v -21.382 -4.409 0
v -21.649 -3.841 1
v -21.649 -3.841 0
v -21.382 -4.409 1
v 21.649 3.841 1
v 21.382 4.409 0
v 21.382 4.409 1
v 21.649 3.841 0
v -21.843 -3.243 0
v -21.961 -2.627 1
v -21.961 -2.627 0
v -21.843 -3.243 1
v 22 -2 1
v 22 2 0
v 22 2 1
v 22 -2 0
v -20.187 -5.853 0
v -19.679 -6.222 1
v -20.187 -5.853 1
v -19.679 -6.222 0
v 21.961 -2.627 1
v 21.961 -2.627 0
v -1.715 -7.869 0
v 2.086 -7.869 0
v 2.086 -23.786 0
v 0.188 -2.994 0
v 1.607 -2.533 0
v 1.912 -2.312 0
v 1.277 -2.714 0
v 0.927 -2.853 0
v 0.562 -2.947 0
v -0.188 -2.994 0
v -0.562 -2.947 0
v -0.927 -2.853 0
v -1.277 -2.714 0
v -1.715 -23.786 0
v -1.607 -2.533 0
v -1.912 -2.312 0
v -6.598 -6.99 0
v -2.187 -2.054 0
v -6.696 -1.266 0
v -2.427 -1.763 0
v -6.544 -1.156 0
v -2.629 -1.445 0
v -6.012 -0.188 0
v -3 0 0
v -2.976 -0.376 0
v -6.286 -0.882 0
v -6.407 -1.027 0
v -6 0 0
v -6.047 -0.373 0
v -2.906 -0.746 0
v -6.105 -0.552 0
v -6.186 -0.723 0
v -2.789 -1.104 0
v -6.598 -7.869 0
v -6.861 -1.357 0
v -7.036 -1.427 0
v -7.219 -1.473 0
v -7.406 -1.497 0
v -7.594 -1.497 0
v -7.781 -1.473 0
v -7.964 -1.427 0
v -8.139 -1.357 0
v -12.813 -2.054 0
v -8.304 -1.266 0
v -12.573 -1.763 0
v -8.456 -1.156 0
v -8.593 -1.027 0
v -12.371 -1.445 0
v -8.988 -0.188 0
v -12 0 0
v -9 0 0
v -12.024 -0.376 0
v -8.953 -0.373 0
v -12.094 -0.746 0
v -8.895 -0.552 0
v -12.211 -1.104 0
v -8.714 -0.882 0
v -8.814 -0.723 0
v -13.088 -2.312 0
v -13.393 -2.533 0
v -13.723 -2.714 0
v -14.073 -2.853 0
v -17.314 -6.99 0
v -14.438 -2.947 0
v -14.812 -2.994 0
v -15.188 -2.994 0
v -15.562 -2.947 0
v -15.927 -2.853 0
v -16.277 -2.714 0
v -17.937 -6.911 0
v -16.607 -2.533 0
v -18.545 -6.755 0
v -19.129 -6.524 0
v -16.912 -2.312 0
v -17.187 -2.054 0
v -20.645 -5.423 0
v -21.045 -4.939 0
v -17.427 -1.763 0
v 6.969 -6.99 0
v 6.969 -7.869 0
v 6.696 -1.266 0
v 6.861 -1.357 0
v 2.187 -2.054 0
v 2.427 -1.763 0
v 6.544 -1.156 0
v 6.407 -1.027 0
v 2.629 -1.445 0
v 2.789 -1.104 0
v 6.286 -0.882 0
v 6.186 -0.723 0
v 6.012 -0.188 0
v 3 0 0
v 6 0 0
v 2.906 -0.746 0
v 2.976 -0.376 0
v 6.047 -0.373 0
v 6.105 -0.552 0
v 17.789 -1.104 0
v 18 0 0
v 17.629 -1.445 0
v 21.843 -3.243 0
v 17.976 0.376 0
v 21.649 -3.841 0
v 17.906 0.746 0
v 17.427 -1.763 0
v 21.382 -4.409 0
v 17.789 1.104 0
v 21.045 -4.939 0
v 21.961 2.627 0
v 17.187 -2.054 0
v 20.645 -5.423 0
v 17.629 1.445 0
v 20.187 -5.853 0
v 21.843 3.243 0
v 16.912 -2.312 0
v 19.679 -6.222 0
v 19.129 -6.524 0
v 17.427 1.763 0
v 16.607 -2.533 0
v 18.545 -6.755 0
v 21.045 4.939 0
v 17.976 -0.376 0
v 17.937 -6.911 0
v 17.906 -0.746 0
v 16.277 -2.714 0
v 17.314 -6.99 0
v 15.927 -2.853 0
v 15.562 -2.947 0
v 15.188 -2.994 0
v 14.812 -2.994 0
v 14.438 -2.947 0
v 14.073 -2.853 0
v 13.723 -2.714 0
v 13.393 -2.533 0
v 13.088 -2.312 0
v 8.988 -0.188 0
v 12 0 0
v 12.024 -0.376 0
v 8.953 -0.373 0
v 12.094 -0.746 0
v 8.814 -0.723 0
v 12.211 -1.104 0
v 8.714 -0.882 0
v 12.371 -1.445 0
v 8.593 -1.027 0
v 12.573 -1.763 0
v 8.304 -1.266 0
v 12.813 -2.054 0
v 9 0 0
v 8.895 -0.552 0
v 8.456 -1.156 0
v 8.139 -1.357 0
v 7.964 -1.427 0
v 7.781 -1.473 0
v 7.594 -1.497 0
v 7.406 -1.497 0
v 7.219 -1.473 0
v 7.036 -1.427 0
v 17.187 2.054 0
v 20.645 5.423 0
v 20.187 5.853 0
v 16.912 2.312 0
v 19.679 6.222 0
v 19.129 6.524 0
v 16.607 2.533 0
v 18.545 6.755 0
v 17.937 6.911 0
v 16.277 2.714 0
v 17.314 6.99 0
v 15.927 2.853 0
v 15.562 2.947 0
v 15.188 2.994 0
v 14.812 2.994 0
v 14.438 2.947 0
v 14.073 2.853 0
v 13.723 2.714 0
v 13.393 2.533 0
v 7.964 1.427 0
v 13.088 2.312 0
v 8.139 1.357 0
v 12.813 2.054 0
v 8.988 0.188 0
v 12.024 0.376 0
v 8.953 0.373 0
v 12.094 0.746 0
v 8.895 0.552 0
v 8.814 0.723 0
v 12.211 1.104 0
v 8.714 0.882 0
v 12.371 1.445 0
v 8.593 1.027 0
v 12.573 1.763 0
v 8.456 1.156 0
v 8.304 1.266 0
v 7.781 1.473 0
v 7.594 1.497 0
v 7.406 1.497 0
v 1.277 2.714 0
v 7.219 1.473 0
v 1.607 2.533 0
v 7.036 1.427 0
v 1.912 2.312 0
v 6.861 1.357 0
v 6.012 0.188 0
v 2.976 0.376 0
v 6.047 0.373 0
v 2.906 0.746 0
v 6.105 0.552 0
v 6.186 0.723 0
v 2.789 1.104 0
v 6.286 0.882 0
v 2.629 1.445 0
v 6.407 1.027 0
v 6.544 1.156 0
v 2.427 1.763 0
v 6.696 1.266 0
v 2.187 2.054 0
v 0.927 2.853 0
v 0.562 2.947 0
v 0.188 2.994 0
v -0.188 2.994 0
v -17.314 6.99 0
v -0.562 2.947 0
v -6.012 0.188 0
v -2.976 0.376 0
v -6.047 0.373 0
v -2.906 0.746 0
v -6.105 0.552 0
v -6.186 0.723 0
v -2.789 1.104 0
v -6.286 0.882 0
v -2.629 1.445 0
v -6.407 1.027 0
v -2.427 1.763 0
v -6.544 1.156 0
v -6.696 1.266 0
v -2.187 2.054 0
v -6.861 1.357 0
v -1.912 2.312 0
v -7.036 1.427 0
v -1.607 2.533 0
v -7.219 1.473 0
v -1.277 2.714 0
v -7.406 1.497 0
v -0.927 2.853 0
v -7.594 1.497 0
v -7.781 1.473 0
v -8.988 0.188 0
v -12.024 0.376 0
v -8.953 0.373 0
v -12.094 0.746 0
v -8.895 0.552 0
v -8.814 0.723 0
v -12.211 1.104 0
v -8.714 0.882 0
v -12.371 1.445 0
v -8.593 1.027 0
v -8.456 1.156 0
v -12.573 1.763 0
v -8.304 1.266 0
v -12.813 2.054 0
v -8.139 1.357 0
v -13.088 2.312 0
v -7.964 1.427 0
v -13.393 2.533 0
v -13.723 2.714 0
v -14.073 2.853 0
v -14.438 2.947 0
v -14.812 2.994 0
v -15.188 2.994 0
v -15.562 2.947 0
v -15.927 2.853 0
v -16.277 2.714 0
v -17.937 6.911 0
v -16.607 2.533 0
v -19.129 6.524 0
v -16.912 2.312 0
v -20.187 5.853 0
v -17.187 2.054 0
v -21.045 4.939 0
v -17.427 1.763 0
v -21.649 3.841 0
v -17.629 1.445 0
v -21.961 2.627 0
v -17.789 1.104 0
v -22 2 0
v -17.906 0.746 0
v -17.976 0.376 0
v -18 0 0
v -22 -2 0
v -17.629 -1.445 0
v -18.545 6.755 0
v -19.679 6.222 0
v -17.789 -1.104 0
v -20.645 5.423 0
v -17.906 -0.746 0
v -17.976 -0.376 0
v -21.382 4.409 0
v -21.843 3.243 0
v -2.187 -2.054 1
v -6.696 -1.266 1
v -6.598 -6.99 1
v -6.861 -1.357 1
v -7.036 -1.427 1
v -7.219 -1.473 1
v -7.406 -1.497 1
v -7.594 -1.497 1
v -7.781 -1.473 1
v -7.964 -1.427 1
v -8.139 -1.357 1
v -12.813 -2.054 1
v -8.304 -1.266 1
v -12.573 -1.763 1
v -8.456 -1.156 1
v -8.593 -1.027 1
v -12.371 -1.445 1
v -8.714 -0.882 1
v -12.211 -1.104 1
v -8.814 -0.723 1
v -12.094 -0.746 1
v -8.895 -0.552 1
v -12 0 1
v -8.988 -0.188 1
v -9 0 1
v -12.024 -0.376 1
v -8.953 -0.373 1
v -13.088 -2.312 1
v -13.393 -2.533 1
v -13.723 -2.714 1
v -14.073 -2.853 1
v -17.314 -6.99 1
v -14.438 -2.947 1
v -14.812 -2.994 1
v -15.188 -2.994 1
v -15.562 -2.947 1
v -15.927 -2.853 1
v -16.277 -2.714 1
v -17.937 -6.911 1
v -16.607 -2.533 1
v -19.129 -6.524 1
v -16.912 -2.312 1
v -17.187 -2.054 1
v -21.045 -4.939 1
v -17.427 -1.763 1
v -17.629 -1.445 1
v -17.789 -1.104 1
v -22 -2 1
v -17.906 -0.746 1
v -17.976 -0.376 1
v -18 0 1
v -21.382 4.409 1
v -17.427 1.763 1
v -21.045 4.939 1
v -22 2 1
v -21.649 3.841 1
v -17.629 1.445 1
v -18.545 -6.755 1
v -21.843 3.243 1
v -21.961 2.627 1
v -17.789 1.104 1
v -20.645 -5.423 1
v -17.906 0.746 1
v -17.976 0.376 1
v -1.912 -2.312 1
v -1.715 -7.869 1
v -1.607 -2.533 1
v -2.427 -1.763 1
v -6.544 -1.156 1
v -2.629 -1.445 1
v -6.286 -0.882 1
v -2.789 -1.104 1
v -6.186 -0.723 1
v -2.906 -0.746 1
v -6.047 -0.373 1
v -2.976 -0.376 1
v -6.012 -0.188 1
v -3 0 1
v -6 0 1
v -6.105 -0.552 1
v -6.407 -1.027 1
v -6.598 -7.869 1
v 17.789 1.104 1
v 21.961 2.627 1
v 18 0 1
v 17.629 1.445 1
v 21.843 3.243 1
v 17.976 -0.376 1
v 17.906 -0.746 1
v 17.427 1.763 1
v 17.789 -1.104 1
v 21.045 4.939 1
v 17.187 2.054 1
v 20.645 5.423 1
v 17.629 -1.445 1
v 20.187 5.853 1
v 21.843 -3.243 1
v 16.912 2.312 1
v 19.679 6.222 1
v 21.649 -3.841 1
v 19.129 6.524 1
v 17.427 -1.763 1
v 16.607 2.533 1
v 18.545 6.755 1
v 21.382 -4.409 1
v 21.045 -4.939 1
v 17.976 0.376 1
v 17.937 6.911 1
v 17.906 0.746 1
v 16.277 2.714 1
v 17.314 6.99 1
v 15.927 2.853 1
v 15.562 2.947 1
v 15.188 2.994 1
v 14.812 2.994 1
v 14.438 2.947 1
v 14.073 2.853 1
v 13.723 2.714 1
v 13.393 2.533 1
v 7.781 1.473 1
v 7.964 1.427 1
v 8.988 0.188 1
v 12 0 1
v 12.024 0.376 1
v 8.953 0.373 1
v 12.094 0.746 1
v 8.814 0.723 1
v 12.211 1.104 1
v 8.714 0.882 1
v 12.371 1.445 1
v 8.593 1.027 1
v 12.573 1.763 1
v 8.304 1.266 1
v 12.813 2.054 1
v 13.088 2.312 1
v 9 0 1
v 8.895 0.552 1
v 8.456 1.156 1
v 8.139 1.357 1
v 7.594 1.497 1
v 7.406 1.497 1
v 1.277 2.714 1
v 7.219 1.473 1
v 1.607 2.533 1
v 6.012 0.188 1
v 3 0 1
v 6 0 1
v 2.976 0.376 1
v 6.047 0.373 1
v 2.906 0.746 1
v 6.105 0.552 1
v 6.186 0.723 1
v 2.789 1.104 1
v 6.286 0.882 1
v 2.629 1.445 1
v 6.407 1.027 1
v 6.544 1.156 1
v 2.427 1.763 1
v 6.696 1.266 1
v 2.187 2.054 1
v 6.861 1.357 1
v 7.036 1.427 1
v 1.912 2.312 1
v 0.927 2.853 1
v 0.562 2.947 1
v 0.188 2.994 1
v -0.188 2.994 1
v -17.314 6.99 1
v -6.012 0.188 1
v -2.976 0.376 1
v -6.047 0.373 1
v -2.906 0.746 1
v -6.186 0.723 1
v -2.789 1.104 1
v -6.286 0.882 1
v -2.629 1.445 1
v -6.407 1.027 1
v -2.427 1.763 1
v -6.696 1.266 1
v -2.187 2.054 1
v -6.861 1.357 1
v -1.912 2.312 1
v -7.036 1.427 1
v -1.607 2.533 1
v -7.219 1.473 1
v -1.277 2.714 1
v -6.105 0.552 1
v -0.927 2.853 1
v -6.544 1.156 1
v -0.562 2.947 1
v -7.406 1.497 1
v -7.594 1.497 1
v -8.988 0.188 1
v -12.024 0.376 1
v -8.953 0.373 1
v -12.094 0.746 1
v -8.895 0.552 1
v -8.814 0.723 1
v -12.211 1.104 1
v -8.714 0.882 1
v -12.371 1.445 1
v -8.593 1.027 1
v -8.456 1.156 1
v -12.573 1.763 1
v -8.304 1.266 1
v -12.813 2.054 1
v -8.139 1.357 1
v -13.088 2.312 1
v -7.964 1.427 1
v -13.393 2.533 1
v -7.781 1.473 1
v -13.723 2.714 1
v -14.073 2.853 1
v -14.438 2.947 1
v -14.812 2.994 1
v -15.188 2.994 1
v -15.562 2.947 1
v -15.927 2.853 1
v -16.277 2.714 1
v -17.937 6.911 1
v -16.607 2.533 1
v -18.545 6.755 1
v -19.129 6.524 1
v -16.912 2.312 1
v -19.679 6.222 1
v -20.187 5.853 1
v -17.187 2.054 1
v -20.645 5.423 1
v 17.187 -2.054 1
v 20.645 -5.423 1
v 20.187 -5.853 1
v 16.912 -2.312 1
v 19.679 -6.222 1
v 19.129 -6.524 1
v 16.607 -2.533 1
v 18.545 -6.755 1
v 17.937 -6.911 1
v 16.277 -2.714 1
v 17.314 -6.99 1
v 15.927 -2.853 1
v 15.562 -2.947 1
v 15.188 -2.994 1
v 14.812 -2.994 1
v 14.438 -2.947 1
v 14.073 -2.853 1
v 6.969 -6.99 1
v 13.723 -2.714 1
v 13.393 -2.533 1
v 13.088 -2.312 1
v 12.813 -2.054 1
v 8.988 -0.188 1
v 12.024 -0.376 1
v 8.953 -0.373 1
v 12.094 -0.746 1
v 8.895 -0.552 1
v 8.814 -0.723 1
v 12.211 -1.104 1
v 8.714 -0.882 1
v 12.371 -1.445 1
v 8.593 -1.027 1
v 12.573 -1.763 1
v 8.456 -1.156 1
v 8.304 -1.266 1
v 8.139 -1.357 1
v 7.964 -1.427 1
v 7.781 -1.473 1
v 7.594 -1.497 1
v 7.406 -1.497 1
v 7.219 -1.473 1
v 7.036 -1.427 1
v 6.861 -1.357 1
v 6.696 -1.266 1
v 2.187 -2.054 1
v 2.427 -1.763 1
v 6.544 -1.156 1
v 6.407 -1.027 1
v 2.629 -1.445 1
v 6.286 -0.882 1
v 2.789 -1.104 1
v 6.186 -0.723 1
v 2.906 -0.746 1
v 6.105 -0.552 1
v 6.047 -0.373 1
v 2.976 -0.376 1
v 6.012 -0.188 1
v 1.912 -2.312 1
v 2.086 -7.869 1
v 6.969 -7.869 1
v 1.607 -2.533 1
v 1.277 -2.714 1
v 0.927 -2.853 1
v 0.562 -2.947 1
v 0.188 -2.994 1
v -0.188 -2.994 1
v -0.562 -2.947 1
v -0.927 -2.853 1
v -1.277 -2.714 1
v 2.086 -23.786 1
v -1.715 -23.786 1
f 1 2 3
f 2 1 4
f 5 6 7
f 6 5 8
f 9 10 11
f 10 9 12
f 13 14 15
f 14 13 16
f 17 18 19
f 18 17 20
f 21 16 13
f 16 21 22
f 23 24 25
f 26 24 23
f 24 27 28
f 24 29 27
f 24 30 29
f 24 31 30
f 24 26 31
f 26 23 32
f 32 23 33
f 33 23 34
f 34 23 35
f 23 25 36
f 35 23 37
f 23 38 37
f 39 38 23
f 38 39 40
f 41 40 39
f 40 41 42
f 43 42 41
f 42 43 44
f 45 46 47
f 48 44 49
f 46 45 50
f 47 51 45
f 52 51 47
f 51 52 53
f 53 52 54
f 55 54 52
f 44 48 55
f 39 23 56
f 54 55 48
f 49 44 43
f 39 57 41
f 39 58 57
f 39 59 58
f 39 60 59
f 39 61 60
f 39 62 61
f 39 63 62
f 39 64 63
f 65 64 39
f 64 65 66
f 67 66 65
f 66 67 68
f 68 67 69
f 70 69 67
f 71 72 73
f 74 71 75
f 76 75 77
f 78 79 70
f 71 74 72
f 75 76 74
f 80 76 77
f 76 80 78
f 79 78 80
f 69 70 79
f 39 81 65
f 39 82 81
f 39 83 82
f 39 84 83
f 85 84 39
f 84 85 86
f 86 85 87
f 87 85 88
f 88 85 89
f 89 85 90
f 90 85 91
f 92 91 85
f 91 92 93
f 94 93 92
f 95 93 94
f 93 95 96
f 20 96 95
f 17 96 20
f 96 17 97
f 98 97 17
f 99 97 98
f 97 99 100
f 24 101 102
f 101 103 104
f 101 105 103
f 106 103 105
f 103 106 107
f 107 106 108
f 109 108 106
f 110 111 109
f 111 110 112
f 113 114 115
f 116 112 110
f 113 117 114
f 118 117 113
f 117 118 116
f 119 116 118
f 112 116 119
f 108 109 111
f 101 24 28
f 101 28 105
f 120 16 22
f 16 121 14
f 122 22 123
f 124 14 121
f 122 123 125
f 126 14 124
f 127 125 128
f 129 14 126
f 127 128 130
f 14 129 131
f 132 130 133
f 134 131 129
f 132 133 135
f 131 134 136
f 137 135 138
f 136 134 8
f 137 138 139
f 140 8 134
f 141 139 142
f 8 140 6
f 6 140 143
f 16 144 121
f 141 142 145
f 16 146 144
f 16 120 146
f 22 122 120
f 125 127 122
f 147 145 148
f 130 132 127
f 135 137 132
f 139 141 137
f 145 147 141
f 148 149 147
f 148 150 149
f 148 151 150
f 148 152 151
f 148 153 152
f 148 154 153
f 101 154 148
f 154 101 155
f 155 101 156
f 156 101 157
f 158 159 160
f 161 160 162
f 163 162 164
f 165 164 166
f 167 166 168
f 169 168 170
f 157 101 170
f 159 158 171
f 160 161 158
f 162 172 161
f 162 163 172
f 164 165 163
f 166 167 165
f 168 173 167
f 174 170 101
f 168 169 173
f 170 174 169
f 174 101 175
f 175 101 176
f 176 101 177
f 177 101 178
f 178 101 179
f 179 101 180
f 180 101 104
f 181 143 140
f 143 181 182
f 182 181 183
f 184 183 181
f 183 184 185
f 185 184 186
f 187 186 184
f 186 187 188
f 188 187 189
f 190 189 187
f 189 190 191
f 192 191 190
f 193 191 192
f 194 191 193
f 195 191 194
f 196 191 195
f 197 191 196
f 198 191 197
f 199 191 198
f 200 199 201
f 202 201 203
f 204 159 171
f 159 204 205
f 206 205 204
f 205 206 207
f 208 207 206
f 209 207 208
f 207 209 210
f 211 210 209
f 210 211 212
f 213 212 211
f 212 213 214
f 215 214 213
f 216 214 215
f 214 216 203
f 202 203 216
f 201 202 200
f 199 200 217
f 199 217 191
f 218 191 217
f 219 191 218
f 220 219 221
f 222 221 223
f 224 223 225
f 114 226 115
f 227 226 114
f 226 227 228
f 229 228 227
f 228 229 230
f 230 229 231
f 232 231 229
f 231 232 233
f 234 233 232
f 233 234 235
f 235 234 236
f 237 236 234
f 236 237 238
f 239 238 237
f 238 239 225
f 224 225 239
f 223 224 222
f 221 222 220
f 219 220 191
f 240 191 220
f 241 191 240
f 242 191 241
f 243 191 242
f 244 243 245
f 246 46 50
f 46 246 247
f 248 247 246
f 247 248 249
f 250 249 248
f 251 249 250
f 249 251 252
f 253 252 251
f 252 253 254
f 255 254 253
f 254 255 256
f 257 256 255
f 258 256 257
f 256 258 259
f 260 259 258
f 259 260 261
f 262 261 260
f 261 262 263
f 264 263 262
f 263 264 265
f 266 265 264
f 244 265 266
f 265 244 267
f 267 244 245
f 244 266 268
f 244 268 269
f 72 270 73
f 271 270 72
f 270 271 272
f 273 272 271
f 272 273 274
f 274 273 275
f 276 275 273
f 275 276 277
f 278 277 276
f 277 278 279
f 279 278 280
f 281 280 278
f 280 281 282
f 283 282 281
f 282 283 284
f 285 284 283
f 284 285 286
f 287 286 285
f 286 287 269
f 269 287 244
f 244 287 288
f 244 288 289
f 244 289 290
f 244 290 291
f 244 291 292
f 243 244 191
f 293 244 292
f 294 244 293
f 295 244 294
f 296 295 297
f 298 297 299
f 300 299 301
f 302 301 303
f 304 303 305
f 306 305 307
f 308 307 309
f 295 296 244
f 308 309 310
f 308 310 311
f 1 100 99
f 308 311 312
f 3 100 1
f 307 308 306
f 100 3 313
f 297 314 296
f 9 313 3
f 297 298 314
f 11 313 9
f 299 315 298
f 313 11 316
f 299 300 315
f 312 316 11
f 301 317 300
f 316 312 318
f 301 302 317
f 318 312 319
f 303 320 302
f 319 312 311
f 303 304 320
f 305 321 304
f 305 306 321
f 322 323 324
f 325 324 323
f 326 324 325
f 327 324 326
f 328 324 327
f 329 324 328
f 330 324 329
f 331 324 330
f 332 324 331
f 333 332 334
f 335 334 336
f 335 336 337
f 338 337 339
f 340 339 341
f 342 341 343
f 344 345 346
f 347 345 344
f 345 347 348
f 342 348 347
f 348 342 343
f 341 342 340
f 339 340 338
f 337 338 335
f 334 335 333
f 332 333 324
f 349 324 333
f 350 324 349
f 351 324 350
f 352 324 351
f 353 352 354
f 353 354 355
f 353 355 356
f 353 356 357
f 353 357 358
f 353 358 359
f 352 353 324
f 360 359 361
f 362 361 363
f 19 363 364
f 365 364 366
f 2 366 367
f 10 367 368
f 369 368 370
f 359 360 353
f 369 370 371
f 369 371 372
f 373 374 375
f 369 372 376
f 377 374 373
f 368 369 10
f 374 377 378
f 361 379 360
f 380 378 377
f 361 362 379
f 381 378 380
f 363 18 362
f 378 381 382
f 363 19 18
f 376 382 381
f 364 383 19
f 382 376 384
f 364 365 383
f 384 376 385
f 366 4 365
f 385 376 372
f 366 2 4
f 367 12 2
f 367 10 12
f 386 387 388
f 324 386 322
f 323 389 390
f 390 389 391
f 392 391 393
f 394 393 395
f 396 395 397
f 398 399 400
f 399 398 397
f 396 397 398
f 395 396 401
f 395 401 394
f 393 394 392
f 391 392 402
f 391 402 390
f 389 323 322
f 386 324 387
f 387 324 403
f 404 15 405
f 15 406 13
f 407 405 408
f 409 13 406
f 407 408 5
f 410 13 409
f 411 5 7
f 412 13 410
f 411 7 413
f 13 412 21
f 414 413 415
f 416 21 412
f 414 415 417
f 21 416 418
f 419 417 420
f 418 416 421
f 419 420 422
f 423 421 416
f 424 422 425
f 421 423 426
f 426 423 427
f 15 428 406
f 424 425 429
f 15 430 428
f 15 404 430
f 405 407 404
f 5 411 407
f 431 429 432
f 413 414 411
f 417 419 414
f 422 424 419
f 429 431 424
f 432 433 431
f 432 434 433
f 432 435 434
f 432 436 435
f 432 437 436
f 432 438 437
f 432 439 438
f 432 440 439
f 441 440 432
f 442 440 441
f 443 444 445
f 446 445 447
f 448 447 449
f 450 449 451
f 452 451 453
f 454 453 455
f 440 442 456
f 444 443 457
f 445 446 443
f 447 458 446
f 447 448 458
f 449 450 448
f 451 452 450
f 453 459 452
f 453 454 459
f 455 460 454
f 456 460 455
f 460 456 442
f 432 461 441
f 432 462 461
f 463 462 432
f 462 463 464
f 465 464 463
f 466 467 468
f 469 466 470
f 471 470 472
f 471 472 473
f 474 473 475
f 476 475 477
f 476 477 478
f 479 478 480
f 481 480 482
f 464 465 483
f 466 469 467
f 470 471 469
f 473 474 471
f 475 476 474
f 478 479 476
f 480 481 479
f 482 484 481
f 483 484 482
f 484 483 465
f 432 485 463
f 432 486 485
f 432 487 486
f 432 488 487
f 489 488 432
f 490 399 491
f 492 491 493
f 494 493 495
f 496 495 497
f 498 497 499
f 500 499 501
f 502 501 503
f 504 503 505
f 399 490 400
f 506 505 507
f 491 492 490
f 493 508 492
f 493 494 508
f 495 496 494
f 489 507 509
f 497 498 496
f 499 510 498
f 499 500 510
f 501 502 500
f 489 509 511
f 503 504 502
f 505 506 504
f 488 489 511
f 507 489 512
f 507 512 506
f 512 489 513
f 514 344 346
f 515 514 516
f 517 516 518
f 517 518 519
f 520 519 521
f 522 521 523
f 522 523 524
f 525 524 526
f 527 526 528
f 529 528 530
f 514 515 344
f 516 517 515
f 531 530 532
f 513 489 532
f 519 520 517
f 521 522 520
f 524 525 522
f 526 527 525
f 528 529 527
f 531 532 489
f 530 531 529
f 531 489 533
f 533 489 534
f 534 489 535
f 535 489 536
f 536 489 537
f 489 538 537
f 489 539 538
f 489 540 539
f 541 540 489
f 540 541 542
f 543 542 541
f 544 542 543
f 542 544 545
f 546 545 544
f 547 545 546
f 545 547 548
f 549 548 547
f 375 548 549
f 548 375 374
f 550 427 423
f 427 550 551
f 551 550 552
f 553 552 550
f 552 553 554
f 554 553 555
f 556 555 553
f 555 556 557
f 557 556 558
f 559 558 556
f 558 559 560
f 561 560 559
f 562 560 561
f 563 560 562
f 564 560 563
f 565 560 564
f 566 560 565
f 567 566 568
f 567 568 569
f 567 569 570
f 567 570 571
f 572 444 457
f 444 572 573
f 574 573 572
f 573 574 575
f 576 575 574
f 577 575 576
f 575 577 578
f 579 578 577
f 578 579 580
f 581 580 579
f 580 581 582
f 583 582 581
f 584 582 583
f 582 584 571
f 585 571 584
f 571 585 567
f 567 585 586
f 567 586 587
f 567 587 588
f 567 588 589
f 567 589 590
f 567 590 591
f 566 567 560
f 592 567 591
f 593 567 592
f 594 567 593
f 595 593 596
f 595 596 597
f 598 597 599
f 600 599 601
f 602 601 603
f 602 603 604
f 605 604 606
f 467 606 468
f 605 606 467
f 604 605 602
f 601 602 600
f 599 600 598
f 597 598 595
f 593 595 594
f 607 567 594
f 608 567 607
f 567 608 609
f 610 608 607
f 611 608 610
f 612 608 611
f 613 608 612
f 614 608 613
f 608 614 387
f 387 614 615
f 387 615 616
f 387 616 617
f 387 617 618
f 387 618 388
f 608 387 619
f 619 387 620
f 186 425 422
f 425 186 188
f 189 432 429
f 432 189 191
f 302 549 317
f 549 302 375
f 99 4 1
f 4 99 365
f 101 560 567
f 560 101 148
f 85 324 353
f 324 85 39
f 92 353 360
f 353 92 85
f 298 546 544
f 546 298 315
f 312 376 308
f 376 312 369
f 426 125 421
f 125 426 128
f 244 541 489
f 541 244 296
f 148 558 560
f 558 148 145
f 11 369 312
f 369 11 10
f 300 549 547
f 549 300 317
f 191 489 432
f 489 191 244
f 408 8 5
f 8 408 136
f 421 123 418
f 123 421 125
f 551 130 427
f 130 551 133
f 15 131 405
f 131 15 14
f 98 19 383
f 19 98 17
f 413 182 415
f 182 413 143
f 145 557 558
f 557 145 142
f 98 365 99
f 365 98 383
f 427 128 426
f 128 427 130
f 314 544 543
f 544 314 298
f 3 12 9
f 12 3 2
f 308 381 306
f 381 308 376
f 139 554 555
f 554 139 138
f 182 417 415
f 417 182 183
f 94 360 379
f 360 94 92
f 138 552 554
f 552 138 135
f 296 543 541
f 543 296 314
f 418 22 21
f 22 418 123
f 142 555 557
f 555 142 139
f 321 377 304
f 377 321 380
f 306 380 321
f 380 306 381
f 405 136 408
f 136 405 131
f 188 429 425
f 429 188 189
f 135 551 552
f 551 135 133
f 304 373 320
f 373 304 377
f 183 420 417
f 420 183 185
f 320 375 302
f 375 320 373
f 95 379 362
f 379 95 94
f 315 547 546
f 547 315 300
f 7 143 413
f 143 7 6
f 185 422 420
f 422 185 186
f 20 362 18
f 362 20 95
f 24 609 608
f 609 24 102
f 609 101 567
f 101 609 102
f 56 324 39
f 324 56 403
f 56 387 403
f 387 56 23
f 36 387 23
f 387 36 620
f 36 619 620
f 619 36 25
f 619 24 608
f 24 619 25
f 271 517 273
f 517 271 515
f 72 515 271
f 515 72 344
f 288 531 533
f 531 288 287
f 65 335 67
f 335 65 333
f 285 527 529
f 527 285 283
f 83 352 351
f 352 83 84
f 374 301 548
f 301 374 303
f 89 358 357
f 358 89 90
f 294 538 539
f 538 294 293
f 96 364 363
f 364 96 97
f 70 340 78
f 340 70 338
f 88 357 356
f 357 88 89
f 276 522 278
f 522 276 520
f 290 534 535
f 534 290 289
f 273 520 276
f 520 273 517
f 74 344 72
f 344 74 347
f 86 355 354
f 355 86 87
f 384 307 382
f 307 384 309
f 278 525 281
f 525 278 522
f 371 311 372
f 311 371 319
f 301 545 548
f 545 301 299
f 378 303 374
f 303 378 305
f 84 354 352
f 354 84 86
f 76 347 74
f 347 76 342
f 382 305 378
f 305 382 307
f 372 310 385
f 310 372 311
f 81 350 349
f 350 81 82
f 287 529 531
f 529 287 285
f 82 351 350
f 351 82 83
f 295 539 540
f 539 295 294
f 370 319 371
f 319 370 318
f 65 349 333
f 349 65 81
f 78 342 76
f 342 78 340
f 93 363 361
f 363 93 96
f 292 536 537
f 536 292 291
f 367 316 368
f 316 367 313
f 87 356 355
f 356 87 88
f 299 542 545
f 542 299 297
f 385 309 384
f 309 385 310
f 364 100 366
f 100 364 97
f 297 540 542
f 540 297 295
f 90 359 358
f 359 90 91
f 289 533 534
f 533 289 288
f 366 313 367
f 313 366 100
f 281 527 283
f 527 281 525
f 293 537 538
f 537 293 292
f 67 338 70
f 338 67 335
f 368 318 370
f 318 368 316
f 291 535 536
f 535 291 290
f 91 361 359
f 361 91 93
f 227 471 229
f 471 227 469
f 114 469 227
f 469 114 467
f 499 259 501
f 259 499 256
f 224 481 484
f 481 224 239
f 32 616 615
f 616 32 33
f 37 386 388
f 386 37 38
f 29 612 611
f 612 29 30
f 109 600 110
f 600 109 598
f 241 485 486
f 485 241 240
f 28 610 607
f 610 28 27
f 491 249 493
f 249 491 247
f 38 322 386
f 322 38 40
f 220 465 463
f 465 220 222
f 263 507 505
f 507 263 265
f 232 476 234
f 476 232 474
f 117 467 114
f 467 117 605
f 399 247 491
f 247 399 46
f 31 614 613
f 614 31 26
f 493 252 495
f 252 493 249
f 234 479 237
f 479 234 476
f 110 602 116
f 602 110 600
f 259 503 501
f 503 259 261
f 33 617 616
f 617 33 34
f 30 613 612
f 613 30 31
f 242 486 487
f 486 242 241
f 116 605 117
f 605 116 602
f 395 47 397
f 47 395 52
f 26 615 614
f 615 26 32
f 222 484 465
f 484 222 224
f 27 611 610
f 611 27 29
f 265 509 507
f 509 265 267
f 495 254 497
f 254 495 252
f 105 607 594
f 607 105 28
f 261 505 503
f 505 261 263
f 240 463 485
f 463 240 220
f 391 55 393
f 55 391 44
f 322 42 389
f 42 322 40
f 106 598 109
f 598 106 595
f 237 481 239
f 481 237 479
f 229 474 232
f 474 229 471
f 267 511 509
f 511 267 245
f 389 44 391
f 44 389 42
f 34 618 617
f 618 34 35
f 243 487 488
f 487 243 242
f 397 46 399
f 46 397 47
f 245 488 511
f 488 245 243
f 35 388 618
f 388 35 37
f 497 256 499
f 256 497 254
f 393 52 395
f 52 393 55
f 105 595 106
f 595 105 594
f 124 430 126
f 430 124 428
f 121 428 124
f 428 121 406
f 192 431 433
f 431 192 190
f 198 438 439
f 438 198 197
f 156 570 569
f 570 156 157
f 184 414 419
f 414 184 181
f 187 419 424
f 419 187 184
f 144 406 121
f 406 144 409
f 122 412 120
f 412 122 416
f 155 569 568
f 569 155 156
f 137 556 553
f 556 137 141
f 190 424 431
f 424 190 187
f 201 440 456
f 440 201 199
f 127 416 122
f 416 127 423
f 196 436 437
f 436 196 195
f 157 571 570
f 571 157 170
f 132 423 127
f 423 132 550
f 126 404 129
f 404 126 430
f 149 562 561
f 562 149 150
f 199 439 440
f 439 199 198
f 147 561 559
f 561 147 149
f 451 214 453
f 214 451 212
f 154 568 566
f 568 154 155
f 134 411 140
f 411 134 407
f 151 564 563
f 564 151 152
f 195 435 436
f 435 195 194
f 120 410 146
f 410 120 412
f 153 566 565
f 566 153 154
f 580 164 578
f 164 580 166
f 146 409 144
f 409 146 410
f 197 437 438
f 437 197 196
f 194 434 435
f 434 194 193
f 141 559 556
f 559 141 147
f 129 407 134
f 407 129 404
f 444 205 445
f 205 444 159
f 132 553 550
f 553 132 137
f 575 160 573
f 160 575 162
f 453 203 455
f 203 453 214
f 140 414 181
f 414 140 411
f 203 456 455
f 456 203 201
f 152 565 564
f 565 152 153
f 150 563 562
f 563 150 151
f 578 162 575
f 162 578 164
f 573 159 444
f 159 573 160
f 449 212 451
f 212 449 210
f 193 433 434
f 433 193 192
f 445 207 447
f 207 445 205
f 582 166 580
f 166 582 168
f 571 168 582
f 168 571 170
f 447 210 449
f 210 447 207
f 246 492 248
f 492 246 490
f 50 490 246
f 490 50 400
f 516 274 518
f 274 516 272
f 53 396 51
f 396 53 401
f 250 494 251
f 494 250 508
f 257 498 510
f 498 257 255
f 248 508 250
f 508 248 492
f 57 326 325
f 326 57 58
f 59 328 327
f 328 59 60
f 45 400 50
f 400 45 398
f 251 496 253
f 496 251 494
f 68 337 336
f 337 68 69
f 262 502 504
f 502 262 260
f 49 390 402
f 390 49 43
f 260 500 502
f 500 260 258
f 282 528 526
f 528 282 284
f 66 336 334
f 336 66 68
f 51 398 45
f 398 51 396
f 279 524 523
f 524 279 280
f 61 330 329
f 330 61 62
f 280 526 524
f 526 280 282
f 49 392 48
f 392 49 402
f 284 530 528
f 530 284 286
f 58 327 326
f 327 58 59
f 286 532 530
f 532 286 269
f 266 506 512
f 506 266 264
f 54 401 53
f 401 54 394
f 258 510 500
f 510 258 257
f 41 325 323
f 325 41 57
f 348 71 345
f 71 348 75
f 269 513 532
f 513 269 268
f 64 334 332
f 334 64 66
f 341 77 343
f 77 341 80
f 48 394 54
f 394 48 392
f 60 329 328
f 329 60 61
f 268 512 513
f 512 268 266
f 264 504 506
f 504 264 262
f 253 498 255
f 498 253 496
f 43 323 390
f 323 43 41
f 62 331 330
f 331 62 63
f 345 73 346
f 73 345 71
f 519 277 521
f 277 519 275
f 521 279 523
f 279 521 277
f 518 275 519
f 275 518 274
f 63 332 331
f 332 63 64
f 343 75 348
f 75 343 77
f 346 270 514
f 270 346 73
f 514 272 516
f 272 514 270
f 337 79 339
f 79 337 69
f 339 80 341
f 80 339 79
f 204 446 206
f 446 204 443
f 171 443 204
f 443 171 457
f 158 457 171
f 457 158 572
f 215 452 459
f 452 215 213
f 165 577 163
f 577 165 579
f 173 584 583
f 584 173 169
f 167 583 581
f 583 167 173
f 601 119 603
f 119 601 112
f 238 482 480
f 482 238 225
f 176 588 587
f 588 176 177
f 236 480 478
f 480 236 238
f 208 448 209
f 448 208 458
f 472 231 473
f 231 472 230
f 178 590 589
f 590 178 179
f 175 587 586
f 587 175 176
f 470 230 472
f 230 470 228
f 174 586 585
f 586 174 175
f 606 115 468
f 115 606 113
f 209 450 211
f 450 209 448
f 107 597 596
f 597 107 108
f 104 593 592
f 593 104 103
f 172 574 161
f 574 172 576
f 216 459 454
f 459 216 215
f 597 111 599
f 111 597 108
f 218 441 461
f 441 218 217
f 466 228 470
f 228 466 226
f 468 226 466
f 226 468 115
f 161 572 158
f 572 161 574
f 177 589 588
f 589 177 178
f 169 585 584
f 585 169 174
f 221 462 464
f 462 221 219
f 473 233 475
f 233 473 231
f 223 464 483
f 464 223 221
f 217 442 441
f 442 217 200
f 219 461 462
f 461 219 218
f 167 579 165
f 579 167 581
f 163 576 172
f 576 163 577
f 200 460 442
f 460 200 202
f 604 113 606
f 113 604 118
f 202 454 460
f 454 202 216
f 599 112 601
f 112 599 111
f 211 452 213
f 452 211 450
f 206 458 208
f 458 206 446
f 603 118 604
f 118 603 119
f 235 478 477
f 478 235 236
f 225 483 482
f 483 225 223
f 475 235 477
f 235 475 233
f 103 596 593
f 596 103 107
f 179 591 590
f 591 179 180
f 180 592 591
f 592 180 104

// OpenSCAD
$fn = 50;


difference() {
	union() {
		*color(alpha = 1.0000000000, c = "gray") {
			translate(v = [0, 14, 0]) {
				linear_extrude(height = 1) {
					text(font = "Arial:style=Bold", halign = "center", size = 4.5000000000, text = "COMMENT description oobb_plate_shape_p_type_1_depth_3_width_1_thickness_t_extra_oobb_size", valign = "center");
				}
			}
		}
		hull() {
			translate(v = [-17.0000000000, 2.0000000000, 0]) {
				cylinder(h = 1, r = 5);
			}
			translate(v = [17.0000000000, 2.0000000000, 0]) {
				cylinder(h = 1, r = 5);
			}
			translate(v = [-17.0000000000, -2.0000000000, 0]) {
				cylinder(h = 1, r = 5);
			}
			translate(v = [17.0000000000, -2.0000000000, 0]) {
				cylinder(h = 1, r = 5);
			}
		}
		translate(v = [0, -5, 0]) {
			linear_extrude(height = 1) {
				text(font = "DejaVu Sans Mono:style=Bold", halign = "center", size = 19.0000000000, text = "T", valign = "top");
			}
		}
	}
	union() {
		*color(alpha = 1.0000000000, c = "gray") {
			translate(v = [0, 14, 0]) {
				linear_extrude(height = 1) {
					text(font = "Arial:style=Bold", halign = "center", size = 4.5000000000, text = "COMMENT description oobb_holes_shape_n_type_3_width_1_thickness_t_extra_oobb_size_1_height_'all'_holes_true_both_holes", valign = "center");
				}
			}
		}
		translate(v = [-15.0000000000, 0.0000000000, 0]) {
			translate(v = [0, 0, -50]) {
				cylinder(h = 100, r = 3.0000000000);
			}
		}
		translate(v = [0, 0, -50]) {
			cylinder(h = 100, r = 3.0000000000);
		}
		translate(v = [15.0000000000, 0.0000000000, 0]) {
			translate(v = [0, 0, -50]) {
				cylinder(h = 100, r = 3.0000000000);
			}
		}
		translate(v = [-15.0000000000, 0.0000000000, 0]) {
			translate(v = [0, 0, -50]) {
				cylinder(h = 100, r = 1.5000000000);
			}
		}
		translate(v = [-7.5000000000, 0.0000000000, 0]) {
			translate(v = [0, 0, -50]) {
				cylinder(h = 100, r = 1.5000000000);
			}
		}
		translate(v = [0, 0, -50]) {
			cylinder(h = 100, r = 1.5000000000);
		}
		translate(v = [7.5000000000, 0.0000000000, 0]) {
			translate(v = [0, 0, -50]) {
				cylinder(h = 100, r = 1.5000000000);
			}
		}
		translate(v = [15.0000000000, 0.0000000000, 0]) {
			translate(v = [0, 0, -50]) {
				cylinder(h = 100, r = 1.5000000000);
			}
		}
	}
}
